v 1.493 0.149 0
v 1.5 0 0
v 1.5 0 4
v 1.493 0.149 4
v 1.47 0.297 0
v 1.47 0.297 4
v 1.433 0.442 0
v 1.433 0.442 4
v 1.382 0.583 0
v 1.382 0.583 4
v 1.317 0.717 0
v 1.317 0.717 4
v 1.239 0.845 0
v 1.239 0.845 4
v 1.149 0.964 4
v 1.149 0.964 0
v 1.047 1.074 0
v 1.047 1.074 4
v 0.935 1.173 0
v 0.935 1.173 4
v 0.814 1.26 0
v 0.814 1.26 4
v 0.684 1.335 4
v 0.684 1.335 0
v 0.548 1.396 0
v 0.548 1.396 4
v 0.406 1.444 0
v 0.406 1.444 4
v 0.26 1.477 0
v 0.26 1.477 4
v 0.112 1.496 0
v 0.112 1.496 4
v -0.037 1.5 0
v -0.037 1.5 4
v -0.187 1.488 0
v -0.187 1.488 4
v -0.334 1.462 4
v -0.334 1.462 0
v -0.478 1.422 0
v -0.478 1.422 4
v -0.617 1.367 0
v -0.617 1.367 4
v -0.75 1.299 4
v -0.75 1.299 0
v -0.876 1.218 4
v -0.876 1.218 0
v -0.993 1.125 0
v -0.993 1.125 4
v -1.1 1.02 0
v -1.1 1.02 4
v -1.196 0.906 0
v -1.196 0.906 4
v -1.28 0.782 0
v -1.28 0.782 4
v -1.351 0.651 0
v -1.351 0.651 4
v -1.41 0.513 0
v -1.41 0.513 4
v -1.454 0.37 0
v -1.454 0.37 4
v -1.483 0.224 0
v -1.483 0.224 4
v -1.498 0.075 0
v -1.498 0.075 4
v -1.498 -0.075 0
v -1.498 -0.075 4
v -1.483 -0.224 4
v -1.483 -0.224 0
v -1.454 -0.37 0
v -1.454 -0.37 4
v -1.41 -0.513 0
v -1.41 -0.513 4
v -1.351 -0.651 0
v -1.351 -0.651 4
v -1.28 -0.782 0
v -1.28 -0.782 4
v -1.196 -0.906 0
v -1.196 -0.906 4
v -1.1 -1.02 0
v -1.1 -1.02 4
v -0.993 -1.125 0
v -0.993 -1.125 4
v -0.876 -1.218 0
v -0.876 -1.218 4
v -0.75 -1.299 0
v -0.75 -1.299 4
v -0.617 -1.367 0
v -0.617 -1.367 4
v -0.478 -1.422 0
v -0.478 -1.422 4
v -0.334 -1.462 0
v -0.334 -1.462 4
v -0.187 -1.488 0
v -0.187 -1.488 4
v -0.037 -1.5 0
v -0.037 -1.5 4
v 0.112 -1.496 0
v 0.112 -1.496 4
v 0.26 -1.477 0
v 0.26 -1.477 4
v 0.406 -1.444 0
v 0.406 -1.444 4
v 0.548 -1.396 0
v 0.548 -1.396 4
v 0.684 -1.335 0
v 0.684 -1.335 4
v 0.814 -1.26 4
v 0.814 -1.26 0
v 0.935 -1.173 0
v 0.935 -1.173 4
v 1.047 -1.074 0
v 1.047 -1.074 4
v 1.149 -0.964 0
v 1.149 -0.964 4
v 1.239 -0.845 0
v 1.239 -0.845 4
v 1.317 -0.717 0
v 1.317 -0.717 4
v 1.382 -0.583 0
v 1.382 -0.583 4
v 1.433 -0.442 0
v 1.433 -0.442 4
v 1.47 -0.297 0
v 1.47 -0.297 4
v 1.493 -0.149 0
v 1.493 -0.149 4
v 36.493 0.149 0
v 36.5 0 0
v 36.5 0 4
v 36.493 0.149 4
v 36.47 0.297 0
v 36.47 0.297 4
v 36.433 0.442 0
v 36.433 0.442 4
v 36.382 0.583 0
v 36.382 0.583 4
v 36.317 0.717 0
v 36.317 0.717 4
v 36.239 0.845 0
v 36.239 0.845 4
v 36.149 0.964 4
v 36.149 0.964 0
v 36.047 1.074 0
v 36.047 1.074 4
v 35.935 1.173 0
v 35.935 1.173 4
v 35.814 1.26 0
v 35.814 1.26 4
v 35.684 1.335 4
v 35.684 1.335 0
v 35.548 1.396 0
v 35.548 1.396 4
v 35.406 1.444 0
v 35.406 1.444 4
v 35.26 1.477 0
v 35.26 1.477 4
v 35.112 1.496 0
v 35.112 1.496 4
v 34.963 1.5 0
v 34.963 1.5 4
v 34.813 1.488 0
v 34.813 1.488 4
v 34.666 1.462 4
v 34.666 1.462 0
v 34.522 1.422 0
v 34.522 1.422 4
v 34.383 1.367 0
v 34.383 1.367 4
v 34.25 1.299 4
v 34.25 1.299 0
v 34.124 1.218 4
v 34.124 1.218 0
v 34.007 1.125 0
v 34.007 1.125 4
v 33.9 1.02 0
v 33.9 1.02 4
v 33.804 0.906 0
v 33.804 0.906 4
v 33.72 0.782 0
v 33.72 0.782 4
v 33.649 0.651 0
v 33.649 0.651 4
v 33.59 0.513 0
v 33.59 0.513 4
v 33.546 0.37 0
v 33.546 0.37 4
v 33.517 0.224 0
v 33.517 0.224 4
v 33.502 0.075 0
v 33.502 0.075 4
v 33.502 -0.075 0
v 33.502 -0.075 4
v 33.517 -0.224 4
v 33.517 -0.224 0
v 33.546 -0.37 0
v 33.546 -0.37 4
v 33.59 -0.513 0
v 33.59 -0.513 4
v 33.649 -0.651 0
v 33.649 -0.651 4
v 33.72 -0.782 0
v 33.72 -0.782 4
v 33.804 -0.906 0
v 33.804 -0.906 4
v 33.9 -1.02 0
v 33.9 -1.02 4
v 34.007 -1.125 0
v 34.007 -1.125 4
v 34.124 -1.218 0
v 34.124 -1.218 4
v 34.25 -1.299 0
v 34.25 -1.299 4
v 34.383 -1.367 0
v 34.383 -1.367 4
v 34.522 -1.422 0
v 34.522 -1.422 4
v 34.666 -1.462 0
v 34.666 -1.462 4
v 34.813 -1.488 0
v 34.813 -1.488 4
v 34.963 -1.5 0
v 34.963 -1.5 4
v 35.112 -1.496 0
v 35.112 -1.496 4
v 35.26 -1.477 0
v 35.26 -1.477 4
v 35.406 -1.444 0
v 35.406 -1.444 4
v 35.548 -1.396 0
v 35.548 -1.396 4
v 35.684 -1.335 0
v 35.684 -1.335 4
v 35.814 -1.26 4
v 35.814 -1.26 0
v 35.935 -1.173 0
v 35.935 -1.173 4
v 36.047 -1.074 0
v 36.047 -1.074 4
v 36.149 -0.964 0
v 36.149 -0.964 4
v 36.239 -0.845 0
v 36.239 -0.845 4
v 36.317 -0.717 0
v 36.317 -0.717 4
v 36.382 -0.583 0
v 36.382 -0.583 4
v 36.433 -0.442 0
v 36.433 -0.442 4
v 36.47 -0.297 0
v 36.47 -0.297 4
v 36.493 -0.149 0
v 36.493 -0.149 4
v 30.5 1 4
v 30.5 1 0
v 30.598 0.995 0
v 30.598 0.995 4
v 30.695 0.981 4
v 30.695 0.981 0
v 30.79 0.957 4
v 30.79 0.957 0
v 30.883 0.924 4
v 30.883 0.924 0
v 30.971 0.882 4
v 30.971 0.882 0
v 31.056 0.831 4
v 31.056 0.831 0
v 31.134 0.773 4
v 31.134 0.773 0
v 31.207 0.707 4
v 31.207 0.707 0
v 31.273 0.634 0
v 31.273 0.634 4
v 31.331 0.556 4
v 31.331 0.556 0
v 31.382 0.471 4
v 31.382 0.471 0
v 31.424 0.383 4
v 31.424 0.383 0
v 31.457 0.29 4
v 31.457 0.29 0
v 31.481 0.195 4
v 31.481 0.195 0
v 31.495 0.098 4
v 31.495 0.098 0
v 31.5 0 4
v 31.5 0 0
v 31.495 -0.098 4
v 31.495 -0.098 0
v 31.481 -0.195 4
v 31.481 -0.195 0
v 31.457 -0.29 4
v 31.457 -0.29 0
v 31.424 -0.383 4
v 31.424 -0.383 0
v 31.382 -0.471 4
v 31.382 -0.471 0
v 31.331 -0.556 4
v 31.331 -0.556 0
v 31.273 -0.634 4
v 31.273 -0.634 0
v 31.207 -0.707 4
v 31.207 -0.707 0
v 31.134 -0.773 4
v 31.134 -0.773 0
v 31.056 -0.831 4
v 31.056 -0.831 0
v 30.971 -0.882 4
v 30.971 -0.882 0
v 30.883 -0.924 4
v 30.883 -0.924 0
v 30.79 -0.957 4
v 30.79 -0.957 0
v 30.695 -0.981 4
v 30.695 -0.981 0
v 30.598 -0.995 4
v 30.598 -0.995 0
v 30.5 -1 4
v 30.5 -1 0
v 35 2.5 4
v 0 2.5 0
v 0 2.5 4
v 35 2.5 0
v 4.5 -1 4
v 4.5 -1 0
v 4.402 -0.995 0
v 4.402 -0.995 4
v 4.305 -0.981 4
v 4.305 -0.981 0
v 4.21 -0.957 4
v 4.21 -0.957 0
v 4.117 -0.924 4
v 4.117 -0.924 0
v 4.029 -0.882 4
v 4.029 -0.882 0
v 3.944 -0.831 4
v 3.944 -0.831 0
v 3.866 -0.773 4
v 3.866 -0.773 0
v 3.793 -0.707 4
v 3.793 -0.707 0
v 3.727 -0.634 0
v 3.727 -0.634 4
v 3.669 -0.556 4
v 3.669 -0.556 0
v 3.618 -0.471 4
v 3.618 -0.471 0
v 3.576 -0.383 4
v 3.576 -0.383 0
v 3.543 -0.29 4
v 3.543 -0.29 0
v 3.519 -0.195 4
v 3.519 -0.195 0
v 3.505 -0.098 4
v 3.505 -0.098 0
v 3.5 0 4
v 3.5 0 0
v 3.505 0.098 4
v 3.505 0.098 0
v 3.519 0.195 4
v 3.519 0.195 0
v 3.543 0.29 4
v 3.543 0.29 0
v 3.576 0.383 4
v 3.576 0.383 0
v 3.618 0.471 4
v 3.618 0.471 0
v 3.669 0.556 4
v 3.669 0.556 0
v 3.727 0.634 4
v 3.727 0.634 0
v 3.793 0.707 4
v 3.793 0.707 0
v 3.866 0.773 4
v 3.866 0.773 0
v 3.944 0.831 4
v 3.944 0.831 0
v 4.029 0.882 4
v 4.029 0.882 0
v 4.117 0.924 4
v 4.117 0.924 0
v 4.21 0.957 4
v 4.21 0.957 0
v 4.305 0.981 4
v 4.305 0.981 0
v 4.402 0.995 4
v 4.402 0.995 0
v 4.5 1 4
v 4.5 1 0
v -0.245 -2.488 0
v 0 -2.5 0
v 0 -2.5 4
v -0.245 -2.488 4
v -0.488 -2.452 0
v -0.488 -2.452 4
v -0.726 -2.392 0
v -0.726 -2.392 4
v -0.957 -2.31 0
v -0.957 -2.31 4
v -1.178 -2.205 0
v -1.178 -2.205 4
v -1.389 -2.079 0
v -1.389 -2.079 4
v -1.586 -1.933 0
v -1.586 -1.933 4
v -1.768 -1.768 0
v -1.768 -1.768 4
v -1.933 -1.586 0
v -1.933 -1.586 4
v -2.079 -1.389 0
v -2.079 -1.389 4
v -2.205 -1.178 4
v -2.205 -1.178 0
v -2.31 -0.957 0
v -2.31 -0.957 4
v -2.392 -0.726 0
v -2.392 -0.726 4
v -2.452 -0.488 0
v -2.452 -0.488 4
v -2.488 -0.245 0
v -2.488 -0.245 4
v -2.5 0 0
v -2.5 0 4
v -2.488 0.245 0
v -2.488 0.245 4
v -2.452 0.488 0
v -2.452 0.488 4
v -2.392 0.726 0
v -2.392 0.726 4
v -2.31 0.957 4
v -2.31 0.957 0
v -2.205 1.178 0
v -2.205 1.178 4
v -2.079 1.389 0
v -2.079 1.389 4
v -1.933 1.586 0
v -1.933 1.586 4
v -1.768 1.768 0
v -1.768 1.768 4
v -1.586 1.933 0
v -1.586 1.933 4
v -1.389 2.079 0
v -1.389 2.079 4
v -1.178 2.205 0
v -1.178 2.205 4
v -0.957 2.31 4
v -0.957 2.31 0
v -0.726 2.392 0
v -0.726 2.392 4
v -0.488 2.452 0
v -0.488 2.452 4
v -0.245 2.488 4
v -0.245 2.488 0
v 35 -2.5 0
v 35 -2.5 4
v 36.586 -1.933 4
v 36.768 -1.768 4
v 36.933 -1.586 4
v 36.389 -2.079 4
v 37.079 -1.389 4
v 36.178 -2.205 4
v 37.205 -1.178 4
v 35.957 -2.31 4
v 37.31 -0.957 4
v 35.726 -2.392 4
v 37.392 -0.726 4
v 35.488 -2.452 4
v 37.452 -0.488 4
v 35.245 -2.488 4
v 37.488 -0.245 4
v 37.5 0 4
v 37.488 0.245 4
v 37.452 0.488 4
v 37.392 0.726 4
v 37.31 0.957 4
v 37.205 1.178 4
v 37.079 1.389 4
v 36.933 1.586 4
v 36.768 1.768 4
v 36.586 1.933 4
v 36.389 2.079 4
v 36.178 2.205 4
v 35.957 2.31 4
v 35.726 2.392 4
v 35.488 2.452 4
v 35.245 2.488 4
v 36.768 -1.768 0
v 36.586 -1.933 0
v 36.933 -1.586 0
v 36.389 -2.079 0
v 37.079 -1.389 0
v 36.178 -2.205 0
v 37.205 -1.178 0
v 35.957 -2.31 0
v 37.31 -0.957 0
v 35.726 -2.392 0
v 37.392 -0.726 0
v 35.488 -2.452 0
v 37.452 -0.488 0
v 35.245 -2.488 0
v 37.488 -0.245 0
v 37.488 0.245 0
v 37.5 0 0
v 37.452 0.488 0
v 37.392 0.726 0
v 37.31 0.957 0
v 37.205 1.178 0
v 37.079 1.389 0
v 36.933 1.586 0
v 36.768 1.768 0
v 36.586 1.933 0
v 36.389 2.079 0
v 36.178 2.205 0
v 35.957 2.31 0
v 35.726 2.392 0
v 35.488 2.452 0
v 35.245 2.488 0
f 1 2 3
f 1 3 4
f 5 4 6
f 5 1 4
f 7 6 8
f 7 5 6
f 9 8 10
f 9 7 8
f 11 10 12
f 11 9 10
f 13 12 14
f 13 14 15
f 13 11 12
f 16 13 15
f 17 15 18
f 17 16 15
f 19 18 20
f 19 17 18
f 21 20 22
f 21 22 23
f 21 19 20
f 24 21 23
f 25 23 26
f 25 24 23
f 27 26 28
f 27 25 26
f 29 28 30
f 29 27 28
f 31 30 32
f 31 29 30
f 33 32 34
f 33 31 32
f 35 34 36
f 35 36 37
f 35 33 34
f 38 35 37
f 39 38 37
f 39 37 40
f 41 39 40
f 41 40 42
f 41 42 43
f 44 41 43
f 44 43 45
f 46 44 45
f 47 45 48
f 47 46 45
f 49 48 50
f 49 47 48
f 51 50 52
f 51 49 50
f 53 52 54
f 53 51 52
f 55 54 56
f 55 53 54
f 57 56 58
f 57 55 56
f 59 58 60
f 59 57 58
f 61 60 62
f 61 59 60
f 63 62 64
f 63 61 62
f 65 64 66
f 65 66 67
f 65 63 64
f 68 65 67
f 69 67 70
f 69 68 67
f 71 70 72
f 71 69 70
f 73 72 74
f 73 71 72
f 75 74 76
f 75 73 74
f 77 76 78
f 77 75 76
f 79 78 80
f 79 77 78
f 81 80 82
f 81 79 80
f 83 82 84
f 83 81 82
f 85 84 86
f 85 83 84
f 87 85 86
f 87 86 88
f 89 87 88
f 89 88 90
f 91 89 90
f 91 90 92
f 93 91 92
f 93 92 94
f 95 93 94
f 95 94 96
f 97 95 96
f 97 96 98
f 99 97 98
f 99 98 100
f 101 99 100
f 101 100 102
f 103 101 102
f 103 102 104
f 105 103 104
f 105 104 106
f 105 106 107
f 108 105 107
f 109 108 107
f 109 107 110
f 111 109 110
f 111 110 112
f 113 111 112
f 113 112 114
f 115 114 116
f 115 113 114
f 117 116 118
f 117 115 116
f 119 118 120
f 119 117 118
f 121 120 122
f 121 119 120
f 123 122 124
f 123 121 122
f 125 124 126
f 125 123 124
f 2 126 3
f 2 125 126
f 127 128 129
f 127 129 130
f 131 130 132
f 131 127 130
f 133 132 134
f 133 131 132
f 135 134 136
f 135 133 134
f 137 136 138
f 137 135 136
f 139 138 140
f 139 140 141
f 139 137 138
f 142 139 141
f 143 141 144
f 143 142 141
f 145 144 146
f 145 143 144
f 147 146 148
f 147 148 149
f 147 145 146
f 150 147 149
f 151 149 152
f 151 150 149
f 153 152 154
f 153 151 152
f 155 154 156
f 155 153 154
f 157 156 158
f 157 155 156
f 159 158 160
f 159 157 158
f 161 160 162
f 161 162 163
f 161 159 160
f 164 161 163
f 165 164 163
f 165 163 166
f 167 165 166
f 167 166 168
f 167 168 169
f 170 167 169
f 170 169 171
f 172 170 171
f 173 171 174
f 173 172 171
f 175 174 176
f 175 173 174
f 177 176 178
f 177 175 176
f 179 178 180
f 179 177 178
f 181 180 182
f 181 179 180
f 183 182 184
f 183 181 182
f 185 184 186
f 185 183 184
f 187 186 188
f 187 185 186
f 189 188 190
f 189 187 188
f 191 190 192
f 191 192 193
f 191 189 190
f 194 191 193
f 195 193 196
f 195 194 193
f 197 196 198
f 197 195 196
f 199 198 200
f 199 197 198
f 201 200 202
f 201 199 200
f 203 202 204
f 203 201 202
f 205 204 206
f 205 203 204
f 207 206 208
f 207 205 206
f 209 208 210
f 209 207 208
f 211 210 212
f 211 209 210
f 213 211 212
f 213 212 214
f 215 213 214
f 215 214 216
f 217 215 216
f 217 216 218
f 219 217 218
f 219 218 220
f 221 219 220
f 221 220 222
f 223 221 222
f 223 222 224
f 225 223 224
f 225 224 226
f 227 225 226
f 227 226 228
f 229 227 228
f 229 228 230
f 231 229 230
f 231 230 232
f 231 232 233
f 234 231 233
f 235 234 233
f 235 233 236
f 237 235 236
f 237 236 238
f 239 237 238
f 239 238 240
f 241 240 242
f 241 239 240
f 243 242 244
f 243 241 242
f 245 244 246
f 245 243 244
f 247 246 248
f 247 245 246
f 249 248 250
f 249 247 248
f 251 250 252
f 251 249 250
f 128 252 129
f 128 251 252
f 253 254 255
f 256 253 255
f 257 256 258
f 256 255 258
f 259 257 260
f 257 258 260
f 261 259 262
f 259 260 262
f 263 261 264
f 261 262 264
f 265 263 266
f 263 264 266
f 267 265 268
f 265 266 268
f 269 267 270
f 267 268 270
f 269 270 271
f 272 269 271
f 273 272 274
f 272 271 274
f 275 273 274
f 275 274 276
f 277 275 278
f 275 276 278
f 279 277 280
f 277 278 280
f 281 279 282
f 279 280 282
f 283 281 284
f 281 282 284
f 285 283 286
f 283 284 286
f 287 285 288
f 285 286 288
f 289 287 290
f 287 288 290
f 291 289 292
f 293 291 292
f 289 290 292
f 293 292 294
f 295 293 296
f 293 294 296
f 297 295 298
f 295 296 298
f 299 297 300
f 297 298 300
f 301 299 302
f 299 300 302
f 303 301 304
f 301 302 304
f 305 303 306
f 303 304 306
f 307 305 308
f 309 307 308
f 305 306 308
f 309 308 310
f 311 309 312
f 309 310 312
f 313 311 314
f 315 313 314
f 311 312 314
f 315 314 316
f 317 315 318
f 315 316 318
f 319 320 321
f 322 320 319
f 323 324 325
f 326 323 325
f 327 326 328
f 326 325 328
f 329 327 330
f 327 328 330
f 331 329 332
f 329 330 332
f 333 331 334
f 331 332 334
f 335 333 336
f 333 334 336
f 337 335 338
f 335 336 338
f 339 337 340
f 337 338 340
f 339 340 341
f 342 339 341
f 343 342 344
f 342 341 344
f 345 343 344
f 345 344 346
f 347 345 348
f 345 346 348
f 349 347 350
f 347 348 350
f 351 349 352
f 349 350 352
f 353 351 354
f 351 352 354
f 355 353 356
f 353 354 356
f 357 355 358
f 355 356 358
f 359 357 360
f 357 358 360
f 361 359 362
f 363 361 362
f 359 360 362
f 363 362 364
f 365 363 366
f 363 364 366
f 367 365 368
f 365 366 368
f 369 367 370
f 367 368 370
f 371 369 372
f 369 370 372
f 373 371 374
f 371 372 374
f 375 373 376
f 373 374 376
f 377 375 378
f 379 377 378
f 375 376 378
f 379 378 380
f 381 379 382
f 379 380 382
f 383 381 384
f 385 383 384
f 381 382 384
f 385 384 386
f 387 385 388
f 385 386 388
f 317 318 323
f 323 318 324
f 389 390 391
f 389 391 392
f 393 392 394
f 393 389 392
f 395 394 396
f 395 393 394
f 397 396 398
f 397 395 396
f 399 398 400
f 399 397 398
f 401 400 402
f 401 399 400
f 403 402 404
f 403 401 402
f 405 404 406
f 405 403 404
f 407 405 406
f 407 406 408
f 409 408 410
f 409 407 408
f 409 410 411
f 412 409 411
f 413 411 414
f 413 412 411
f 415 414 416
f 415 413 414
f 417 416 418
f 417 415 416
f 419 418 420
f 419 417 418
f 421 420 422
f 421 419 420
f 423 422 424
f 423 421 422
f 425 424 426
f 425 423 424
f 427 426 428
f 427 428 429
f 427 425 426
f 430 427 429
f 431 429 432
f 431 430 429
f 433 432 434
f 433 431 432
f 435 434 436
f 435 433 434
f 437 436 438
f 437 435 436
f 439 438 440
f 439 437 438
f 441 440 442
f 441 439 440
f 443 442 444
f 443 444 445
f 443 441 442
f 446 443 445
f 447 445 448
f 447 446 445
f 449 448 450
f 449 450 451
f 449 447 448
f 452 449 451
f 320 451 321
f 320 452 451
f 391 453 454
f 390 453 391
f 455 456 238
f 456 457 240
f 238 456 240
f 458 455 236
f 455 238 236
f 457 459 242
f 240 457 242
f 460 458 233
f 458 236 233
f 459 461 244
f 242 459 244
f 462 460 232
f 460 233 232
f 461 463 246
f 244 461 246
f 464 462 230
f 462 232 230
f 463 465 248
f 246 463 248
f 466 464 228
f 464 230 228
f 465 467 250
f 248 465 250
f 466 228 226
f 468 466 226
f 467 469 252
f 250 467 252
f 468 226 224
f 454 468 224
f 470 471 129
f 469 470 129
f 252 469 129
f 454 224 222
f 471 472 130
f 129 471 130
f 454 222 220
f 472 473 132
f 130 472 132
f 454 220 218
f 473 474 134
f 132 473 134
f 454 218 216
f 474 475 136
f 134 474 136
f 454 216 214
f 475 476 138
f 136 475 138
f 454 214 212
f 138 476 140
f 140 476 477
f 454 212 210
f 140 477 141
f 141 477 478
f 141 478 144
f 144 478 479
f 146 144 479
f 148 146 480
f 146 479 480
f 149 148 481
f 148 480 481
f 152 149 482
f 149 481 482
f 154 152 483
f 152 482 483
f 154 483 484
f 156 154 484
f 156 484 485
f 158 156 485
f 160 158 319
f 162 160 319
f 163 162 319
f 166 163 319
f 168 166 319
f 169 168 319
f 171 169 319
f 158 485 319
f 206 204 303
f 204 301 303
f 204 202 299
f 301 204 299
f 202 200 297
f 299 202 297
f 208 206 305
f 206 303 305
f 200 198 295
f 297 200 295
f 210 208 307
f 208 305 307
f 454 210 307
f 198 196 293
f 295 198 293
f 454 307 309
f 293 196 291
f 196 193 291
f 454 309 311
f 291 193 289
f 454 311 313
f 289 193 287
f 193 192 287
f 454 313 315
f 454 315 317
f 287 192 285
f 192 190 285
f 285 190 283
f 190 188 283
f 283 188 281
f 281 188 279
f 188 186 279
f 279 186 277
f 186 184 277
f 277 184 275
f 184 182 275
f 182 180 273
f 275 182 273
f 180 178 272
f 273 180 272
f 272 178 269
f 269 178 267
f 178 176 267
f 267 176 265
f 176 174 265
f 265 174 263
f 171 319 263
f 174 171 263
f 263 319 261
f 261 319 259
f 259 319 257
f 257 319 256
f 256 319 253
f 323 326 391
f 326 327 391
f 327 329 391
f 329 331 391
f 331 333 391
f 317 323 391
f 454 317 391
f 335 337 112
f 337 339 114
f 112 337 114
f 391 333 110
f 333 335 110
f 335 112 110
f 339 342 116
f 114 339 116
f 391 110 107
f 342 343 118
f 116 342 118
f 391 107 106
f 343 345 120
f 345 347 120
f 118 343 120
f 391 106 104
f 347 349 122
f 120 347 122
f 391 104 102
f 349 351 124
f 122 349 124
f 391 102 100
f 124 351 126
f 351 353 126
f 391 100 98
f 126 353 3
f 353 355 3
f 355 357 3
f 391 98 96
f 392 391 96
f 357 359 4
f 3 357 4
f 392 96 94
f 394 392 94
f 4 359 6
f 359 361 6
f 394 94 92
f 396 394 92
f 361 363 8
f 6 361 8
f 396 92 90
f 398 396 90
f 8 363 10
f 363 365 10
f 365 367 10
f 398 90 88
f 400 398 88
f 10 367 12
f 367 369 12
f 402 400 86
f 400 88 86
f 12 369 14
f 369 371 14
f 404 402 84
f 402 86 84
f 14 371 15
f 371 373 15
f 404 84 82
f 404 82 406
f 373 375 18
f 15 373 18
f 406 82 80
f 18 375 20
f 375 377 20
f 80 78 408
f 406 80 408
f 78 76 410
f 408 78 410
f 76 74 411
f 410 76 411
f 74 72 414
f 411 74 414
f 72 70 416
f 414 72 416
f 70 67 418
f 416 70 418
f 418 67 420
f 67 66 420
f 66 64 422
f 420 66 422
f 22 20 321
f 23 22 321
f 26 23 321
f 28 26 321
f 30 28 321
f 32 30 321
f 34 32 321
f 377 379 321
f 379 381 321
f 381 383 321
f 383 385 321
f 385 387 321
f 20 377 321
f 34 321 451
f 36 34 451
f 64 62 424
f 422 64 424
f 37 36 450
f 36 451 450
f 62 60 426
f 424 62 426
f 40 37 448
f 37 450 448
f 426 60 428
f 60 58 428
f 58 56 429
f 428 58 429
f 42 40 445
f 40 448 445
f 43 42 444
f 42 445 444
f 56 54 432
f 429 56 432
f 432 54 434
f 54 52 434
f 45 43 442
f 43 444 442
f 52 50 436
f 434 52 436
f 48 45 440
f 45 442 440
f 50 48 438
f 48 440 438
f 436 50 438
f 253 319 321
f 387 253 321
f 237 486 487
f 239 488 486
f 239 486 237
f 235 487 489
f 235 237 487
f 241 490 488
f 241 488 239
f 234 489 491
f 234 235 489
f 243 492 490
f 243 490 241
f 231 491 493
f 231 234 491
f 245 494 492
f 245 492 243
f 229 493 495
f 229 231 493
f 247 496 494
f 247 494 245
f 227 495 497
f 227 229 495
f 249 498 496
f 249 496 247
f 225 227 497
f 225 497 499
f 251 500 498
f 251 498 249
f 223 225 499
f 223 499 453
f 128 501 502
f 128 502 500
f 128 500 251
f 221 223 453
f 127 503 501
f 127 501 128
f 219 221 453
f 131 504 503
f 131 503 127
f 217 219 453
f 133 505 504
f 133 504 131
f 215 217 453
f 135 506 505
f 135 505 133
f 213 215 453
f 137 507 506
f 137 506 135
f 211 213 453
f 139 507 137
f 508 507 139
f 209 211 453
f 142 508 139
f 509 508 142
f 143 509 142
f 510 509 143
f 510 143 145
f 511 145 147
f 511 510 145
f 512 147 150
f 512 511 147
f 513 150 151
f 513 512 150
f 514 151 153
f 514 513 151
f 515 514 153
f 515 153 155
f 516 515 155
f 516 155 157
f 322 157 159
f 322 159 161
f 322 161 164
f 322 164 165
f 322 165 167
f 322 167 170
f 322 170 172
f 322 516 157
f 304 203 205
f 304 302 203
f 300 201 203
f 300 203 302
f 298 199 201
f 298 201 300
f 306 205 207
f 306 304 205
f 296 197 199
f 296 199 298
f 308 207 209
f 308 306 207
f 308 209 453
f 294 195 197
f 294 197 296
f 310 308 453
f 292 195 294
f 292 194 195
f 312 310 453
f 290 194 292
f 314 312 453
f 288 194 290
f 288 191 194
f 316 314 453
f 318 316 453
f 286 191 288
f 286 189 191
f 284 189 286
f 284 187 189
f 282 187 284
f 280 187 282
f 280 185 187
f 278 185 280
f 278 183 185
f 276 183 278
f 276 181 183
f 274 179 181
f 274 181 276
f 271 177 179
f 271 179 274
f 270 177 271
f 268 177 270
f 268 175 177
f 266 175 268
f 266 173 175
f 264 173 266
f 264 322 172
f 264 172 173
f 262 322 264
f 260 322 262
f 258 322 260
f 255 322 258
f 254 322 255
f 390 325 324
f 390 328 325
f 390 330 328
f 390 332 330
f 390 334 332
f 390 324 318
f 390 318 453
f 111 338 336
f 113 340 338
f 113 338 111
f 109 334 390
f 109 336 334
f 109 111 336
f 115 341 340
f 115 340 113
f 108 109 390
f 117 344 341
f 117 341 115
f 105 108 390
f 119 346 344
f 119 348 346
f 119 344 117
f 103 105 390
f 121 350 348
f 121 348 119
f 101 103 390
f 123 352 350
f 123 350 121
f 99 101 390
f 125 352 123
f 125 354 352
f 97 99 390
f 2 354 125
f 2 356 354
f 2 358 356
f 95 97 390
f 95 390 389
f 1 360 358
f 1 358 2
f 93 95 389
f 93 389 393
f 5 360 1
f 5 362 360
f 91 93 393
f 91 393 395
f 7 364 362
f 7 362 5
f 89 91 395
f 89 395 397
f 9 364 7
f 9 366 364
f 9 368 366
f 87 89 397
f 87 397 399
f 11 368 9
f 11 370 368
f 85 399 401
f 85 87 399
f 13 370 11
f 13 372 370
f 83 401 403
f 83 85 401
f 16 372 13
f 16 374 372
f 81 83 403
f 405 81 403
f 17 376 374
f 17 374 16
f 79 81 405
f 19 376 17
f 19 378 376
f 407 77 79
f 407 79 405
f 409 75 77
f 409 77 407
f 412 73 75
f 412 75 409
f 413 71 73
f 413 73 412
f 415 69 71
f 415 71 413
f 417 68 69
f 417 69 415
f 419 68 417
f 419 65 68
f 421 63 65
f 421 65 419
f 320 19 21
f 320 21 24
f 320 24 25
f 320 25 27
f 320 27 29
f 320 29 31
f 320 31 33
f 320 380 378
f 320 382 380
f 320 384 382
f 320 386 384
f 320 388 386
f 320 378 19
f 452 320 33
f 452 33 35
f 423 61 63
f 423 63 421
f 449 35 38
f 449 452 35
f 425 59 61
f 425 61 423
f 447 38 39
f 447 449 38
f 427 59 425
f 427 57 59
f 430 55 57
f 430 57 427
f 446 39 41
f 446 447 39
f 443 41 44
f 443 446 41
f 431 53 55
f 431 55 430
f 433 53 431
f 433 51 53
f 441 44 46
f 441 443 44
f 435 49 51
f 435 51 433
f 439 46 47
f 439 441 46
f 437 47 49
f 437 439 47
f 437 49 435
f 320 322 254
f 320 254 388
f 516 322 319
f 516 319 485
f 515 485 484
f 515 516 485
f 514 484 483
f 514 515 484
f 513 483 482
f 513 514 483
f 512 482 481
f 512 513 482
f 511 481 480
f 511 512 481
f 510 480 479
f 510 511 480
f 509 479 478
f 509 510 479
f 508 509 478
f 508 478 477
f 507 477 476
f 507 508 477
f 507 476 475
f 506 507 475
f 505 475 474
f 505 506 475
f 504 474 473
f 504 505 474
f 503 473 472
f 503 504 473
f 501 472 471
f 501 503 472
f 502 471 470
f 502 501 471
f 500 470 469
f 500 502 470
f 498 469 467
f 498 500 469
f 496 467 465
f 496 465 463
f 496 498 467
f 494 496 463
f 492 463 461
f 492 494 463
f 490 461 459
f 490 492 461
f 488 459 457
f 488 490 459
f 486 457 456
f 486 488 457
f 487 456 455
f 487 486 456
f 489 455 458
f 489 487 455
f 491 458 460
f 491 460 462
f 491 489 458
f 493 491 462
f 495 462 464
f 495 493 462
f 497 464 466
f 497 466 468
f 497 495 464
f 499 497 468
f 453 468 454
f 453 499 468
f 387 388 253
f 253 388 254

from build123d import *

# Parameters (mm, degrees)
ESQUISSE1_R        = 1.5
BOSS_EXTRU_1_DEPTH = 4


with BuildPart() as part:
    # Esquisse1 → Boss.-Extru.1 (new body)
    with BuildSketch(Plane.XY):
        with BuildLine():
            Line((0, 2.5), (35, 2.5))
            ThreePointArc((35, 2.5), (37.5, 0), (35, -2.5))
            Line((35, -2.5), (0, -2.5))
            ThreePointArc((0, -2.5), (-2.5, 0), (0, 2.5))
        make_face()
        Circle(ESQUISSE1_R, mode=Mode.SUBTRACT)
        with Locations((35, 0)):
            Circle(ESQUISSE1_R, mode=Mode.SUBTRACT)
        with BuildLine():
            Line((4.5, 1), (30.5, 1))
            ThreePointArc((30.5, 1), (31.5, 0), (30.5, -1))
            Line((30.5, -1), (4.5, -1))
            ThreePointArc((4.5, -1), (3.5, 0), (4.5, 1))
        make_face(mode=Mode.SUBTRACT)
    extrude(amount=BOSS_EXTRU_1_DEPTH)


solid = part.part
